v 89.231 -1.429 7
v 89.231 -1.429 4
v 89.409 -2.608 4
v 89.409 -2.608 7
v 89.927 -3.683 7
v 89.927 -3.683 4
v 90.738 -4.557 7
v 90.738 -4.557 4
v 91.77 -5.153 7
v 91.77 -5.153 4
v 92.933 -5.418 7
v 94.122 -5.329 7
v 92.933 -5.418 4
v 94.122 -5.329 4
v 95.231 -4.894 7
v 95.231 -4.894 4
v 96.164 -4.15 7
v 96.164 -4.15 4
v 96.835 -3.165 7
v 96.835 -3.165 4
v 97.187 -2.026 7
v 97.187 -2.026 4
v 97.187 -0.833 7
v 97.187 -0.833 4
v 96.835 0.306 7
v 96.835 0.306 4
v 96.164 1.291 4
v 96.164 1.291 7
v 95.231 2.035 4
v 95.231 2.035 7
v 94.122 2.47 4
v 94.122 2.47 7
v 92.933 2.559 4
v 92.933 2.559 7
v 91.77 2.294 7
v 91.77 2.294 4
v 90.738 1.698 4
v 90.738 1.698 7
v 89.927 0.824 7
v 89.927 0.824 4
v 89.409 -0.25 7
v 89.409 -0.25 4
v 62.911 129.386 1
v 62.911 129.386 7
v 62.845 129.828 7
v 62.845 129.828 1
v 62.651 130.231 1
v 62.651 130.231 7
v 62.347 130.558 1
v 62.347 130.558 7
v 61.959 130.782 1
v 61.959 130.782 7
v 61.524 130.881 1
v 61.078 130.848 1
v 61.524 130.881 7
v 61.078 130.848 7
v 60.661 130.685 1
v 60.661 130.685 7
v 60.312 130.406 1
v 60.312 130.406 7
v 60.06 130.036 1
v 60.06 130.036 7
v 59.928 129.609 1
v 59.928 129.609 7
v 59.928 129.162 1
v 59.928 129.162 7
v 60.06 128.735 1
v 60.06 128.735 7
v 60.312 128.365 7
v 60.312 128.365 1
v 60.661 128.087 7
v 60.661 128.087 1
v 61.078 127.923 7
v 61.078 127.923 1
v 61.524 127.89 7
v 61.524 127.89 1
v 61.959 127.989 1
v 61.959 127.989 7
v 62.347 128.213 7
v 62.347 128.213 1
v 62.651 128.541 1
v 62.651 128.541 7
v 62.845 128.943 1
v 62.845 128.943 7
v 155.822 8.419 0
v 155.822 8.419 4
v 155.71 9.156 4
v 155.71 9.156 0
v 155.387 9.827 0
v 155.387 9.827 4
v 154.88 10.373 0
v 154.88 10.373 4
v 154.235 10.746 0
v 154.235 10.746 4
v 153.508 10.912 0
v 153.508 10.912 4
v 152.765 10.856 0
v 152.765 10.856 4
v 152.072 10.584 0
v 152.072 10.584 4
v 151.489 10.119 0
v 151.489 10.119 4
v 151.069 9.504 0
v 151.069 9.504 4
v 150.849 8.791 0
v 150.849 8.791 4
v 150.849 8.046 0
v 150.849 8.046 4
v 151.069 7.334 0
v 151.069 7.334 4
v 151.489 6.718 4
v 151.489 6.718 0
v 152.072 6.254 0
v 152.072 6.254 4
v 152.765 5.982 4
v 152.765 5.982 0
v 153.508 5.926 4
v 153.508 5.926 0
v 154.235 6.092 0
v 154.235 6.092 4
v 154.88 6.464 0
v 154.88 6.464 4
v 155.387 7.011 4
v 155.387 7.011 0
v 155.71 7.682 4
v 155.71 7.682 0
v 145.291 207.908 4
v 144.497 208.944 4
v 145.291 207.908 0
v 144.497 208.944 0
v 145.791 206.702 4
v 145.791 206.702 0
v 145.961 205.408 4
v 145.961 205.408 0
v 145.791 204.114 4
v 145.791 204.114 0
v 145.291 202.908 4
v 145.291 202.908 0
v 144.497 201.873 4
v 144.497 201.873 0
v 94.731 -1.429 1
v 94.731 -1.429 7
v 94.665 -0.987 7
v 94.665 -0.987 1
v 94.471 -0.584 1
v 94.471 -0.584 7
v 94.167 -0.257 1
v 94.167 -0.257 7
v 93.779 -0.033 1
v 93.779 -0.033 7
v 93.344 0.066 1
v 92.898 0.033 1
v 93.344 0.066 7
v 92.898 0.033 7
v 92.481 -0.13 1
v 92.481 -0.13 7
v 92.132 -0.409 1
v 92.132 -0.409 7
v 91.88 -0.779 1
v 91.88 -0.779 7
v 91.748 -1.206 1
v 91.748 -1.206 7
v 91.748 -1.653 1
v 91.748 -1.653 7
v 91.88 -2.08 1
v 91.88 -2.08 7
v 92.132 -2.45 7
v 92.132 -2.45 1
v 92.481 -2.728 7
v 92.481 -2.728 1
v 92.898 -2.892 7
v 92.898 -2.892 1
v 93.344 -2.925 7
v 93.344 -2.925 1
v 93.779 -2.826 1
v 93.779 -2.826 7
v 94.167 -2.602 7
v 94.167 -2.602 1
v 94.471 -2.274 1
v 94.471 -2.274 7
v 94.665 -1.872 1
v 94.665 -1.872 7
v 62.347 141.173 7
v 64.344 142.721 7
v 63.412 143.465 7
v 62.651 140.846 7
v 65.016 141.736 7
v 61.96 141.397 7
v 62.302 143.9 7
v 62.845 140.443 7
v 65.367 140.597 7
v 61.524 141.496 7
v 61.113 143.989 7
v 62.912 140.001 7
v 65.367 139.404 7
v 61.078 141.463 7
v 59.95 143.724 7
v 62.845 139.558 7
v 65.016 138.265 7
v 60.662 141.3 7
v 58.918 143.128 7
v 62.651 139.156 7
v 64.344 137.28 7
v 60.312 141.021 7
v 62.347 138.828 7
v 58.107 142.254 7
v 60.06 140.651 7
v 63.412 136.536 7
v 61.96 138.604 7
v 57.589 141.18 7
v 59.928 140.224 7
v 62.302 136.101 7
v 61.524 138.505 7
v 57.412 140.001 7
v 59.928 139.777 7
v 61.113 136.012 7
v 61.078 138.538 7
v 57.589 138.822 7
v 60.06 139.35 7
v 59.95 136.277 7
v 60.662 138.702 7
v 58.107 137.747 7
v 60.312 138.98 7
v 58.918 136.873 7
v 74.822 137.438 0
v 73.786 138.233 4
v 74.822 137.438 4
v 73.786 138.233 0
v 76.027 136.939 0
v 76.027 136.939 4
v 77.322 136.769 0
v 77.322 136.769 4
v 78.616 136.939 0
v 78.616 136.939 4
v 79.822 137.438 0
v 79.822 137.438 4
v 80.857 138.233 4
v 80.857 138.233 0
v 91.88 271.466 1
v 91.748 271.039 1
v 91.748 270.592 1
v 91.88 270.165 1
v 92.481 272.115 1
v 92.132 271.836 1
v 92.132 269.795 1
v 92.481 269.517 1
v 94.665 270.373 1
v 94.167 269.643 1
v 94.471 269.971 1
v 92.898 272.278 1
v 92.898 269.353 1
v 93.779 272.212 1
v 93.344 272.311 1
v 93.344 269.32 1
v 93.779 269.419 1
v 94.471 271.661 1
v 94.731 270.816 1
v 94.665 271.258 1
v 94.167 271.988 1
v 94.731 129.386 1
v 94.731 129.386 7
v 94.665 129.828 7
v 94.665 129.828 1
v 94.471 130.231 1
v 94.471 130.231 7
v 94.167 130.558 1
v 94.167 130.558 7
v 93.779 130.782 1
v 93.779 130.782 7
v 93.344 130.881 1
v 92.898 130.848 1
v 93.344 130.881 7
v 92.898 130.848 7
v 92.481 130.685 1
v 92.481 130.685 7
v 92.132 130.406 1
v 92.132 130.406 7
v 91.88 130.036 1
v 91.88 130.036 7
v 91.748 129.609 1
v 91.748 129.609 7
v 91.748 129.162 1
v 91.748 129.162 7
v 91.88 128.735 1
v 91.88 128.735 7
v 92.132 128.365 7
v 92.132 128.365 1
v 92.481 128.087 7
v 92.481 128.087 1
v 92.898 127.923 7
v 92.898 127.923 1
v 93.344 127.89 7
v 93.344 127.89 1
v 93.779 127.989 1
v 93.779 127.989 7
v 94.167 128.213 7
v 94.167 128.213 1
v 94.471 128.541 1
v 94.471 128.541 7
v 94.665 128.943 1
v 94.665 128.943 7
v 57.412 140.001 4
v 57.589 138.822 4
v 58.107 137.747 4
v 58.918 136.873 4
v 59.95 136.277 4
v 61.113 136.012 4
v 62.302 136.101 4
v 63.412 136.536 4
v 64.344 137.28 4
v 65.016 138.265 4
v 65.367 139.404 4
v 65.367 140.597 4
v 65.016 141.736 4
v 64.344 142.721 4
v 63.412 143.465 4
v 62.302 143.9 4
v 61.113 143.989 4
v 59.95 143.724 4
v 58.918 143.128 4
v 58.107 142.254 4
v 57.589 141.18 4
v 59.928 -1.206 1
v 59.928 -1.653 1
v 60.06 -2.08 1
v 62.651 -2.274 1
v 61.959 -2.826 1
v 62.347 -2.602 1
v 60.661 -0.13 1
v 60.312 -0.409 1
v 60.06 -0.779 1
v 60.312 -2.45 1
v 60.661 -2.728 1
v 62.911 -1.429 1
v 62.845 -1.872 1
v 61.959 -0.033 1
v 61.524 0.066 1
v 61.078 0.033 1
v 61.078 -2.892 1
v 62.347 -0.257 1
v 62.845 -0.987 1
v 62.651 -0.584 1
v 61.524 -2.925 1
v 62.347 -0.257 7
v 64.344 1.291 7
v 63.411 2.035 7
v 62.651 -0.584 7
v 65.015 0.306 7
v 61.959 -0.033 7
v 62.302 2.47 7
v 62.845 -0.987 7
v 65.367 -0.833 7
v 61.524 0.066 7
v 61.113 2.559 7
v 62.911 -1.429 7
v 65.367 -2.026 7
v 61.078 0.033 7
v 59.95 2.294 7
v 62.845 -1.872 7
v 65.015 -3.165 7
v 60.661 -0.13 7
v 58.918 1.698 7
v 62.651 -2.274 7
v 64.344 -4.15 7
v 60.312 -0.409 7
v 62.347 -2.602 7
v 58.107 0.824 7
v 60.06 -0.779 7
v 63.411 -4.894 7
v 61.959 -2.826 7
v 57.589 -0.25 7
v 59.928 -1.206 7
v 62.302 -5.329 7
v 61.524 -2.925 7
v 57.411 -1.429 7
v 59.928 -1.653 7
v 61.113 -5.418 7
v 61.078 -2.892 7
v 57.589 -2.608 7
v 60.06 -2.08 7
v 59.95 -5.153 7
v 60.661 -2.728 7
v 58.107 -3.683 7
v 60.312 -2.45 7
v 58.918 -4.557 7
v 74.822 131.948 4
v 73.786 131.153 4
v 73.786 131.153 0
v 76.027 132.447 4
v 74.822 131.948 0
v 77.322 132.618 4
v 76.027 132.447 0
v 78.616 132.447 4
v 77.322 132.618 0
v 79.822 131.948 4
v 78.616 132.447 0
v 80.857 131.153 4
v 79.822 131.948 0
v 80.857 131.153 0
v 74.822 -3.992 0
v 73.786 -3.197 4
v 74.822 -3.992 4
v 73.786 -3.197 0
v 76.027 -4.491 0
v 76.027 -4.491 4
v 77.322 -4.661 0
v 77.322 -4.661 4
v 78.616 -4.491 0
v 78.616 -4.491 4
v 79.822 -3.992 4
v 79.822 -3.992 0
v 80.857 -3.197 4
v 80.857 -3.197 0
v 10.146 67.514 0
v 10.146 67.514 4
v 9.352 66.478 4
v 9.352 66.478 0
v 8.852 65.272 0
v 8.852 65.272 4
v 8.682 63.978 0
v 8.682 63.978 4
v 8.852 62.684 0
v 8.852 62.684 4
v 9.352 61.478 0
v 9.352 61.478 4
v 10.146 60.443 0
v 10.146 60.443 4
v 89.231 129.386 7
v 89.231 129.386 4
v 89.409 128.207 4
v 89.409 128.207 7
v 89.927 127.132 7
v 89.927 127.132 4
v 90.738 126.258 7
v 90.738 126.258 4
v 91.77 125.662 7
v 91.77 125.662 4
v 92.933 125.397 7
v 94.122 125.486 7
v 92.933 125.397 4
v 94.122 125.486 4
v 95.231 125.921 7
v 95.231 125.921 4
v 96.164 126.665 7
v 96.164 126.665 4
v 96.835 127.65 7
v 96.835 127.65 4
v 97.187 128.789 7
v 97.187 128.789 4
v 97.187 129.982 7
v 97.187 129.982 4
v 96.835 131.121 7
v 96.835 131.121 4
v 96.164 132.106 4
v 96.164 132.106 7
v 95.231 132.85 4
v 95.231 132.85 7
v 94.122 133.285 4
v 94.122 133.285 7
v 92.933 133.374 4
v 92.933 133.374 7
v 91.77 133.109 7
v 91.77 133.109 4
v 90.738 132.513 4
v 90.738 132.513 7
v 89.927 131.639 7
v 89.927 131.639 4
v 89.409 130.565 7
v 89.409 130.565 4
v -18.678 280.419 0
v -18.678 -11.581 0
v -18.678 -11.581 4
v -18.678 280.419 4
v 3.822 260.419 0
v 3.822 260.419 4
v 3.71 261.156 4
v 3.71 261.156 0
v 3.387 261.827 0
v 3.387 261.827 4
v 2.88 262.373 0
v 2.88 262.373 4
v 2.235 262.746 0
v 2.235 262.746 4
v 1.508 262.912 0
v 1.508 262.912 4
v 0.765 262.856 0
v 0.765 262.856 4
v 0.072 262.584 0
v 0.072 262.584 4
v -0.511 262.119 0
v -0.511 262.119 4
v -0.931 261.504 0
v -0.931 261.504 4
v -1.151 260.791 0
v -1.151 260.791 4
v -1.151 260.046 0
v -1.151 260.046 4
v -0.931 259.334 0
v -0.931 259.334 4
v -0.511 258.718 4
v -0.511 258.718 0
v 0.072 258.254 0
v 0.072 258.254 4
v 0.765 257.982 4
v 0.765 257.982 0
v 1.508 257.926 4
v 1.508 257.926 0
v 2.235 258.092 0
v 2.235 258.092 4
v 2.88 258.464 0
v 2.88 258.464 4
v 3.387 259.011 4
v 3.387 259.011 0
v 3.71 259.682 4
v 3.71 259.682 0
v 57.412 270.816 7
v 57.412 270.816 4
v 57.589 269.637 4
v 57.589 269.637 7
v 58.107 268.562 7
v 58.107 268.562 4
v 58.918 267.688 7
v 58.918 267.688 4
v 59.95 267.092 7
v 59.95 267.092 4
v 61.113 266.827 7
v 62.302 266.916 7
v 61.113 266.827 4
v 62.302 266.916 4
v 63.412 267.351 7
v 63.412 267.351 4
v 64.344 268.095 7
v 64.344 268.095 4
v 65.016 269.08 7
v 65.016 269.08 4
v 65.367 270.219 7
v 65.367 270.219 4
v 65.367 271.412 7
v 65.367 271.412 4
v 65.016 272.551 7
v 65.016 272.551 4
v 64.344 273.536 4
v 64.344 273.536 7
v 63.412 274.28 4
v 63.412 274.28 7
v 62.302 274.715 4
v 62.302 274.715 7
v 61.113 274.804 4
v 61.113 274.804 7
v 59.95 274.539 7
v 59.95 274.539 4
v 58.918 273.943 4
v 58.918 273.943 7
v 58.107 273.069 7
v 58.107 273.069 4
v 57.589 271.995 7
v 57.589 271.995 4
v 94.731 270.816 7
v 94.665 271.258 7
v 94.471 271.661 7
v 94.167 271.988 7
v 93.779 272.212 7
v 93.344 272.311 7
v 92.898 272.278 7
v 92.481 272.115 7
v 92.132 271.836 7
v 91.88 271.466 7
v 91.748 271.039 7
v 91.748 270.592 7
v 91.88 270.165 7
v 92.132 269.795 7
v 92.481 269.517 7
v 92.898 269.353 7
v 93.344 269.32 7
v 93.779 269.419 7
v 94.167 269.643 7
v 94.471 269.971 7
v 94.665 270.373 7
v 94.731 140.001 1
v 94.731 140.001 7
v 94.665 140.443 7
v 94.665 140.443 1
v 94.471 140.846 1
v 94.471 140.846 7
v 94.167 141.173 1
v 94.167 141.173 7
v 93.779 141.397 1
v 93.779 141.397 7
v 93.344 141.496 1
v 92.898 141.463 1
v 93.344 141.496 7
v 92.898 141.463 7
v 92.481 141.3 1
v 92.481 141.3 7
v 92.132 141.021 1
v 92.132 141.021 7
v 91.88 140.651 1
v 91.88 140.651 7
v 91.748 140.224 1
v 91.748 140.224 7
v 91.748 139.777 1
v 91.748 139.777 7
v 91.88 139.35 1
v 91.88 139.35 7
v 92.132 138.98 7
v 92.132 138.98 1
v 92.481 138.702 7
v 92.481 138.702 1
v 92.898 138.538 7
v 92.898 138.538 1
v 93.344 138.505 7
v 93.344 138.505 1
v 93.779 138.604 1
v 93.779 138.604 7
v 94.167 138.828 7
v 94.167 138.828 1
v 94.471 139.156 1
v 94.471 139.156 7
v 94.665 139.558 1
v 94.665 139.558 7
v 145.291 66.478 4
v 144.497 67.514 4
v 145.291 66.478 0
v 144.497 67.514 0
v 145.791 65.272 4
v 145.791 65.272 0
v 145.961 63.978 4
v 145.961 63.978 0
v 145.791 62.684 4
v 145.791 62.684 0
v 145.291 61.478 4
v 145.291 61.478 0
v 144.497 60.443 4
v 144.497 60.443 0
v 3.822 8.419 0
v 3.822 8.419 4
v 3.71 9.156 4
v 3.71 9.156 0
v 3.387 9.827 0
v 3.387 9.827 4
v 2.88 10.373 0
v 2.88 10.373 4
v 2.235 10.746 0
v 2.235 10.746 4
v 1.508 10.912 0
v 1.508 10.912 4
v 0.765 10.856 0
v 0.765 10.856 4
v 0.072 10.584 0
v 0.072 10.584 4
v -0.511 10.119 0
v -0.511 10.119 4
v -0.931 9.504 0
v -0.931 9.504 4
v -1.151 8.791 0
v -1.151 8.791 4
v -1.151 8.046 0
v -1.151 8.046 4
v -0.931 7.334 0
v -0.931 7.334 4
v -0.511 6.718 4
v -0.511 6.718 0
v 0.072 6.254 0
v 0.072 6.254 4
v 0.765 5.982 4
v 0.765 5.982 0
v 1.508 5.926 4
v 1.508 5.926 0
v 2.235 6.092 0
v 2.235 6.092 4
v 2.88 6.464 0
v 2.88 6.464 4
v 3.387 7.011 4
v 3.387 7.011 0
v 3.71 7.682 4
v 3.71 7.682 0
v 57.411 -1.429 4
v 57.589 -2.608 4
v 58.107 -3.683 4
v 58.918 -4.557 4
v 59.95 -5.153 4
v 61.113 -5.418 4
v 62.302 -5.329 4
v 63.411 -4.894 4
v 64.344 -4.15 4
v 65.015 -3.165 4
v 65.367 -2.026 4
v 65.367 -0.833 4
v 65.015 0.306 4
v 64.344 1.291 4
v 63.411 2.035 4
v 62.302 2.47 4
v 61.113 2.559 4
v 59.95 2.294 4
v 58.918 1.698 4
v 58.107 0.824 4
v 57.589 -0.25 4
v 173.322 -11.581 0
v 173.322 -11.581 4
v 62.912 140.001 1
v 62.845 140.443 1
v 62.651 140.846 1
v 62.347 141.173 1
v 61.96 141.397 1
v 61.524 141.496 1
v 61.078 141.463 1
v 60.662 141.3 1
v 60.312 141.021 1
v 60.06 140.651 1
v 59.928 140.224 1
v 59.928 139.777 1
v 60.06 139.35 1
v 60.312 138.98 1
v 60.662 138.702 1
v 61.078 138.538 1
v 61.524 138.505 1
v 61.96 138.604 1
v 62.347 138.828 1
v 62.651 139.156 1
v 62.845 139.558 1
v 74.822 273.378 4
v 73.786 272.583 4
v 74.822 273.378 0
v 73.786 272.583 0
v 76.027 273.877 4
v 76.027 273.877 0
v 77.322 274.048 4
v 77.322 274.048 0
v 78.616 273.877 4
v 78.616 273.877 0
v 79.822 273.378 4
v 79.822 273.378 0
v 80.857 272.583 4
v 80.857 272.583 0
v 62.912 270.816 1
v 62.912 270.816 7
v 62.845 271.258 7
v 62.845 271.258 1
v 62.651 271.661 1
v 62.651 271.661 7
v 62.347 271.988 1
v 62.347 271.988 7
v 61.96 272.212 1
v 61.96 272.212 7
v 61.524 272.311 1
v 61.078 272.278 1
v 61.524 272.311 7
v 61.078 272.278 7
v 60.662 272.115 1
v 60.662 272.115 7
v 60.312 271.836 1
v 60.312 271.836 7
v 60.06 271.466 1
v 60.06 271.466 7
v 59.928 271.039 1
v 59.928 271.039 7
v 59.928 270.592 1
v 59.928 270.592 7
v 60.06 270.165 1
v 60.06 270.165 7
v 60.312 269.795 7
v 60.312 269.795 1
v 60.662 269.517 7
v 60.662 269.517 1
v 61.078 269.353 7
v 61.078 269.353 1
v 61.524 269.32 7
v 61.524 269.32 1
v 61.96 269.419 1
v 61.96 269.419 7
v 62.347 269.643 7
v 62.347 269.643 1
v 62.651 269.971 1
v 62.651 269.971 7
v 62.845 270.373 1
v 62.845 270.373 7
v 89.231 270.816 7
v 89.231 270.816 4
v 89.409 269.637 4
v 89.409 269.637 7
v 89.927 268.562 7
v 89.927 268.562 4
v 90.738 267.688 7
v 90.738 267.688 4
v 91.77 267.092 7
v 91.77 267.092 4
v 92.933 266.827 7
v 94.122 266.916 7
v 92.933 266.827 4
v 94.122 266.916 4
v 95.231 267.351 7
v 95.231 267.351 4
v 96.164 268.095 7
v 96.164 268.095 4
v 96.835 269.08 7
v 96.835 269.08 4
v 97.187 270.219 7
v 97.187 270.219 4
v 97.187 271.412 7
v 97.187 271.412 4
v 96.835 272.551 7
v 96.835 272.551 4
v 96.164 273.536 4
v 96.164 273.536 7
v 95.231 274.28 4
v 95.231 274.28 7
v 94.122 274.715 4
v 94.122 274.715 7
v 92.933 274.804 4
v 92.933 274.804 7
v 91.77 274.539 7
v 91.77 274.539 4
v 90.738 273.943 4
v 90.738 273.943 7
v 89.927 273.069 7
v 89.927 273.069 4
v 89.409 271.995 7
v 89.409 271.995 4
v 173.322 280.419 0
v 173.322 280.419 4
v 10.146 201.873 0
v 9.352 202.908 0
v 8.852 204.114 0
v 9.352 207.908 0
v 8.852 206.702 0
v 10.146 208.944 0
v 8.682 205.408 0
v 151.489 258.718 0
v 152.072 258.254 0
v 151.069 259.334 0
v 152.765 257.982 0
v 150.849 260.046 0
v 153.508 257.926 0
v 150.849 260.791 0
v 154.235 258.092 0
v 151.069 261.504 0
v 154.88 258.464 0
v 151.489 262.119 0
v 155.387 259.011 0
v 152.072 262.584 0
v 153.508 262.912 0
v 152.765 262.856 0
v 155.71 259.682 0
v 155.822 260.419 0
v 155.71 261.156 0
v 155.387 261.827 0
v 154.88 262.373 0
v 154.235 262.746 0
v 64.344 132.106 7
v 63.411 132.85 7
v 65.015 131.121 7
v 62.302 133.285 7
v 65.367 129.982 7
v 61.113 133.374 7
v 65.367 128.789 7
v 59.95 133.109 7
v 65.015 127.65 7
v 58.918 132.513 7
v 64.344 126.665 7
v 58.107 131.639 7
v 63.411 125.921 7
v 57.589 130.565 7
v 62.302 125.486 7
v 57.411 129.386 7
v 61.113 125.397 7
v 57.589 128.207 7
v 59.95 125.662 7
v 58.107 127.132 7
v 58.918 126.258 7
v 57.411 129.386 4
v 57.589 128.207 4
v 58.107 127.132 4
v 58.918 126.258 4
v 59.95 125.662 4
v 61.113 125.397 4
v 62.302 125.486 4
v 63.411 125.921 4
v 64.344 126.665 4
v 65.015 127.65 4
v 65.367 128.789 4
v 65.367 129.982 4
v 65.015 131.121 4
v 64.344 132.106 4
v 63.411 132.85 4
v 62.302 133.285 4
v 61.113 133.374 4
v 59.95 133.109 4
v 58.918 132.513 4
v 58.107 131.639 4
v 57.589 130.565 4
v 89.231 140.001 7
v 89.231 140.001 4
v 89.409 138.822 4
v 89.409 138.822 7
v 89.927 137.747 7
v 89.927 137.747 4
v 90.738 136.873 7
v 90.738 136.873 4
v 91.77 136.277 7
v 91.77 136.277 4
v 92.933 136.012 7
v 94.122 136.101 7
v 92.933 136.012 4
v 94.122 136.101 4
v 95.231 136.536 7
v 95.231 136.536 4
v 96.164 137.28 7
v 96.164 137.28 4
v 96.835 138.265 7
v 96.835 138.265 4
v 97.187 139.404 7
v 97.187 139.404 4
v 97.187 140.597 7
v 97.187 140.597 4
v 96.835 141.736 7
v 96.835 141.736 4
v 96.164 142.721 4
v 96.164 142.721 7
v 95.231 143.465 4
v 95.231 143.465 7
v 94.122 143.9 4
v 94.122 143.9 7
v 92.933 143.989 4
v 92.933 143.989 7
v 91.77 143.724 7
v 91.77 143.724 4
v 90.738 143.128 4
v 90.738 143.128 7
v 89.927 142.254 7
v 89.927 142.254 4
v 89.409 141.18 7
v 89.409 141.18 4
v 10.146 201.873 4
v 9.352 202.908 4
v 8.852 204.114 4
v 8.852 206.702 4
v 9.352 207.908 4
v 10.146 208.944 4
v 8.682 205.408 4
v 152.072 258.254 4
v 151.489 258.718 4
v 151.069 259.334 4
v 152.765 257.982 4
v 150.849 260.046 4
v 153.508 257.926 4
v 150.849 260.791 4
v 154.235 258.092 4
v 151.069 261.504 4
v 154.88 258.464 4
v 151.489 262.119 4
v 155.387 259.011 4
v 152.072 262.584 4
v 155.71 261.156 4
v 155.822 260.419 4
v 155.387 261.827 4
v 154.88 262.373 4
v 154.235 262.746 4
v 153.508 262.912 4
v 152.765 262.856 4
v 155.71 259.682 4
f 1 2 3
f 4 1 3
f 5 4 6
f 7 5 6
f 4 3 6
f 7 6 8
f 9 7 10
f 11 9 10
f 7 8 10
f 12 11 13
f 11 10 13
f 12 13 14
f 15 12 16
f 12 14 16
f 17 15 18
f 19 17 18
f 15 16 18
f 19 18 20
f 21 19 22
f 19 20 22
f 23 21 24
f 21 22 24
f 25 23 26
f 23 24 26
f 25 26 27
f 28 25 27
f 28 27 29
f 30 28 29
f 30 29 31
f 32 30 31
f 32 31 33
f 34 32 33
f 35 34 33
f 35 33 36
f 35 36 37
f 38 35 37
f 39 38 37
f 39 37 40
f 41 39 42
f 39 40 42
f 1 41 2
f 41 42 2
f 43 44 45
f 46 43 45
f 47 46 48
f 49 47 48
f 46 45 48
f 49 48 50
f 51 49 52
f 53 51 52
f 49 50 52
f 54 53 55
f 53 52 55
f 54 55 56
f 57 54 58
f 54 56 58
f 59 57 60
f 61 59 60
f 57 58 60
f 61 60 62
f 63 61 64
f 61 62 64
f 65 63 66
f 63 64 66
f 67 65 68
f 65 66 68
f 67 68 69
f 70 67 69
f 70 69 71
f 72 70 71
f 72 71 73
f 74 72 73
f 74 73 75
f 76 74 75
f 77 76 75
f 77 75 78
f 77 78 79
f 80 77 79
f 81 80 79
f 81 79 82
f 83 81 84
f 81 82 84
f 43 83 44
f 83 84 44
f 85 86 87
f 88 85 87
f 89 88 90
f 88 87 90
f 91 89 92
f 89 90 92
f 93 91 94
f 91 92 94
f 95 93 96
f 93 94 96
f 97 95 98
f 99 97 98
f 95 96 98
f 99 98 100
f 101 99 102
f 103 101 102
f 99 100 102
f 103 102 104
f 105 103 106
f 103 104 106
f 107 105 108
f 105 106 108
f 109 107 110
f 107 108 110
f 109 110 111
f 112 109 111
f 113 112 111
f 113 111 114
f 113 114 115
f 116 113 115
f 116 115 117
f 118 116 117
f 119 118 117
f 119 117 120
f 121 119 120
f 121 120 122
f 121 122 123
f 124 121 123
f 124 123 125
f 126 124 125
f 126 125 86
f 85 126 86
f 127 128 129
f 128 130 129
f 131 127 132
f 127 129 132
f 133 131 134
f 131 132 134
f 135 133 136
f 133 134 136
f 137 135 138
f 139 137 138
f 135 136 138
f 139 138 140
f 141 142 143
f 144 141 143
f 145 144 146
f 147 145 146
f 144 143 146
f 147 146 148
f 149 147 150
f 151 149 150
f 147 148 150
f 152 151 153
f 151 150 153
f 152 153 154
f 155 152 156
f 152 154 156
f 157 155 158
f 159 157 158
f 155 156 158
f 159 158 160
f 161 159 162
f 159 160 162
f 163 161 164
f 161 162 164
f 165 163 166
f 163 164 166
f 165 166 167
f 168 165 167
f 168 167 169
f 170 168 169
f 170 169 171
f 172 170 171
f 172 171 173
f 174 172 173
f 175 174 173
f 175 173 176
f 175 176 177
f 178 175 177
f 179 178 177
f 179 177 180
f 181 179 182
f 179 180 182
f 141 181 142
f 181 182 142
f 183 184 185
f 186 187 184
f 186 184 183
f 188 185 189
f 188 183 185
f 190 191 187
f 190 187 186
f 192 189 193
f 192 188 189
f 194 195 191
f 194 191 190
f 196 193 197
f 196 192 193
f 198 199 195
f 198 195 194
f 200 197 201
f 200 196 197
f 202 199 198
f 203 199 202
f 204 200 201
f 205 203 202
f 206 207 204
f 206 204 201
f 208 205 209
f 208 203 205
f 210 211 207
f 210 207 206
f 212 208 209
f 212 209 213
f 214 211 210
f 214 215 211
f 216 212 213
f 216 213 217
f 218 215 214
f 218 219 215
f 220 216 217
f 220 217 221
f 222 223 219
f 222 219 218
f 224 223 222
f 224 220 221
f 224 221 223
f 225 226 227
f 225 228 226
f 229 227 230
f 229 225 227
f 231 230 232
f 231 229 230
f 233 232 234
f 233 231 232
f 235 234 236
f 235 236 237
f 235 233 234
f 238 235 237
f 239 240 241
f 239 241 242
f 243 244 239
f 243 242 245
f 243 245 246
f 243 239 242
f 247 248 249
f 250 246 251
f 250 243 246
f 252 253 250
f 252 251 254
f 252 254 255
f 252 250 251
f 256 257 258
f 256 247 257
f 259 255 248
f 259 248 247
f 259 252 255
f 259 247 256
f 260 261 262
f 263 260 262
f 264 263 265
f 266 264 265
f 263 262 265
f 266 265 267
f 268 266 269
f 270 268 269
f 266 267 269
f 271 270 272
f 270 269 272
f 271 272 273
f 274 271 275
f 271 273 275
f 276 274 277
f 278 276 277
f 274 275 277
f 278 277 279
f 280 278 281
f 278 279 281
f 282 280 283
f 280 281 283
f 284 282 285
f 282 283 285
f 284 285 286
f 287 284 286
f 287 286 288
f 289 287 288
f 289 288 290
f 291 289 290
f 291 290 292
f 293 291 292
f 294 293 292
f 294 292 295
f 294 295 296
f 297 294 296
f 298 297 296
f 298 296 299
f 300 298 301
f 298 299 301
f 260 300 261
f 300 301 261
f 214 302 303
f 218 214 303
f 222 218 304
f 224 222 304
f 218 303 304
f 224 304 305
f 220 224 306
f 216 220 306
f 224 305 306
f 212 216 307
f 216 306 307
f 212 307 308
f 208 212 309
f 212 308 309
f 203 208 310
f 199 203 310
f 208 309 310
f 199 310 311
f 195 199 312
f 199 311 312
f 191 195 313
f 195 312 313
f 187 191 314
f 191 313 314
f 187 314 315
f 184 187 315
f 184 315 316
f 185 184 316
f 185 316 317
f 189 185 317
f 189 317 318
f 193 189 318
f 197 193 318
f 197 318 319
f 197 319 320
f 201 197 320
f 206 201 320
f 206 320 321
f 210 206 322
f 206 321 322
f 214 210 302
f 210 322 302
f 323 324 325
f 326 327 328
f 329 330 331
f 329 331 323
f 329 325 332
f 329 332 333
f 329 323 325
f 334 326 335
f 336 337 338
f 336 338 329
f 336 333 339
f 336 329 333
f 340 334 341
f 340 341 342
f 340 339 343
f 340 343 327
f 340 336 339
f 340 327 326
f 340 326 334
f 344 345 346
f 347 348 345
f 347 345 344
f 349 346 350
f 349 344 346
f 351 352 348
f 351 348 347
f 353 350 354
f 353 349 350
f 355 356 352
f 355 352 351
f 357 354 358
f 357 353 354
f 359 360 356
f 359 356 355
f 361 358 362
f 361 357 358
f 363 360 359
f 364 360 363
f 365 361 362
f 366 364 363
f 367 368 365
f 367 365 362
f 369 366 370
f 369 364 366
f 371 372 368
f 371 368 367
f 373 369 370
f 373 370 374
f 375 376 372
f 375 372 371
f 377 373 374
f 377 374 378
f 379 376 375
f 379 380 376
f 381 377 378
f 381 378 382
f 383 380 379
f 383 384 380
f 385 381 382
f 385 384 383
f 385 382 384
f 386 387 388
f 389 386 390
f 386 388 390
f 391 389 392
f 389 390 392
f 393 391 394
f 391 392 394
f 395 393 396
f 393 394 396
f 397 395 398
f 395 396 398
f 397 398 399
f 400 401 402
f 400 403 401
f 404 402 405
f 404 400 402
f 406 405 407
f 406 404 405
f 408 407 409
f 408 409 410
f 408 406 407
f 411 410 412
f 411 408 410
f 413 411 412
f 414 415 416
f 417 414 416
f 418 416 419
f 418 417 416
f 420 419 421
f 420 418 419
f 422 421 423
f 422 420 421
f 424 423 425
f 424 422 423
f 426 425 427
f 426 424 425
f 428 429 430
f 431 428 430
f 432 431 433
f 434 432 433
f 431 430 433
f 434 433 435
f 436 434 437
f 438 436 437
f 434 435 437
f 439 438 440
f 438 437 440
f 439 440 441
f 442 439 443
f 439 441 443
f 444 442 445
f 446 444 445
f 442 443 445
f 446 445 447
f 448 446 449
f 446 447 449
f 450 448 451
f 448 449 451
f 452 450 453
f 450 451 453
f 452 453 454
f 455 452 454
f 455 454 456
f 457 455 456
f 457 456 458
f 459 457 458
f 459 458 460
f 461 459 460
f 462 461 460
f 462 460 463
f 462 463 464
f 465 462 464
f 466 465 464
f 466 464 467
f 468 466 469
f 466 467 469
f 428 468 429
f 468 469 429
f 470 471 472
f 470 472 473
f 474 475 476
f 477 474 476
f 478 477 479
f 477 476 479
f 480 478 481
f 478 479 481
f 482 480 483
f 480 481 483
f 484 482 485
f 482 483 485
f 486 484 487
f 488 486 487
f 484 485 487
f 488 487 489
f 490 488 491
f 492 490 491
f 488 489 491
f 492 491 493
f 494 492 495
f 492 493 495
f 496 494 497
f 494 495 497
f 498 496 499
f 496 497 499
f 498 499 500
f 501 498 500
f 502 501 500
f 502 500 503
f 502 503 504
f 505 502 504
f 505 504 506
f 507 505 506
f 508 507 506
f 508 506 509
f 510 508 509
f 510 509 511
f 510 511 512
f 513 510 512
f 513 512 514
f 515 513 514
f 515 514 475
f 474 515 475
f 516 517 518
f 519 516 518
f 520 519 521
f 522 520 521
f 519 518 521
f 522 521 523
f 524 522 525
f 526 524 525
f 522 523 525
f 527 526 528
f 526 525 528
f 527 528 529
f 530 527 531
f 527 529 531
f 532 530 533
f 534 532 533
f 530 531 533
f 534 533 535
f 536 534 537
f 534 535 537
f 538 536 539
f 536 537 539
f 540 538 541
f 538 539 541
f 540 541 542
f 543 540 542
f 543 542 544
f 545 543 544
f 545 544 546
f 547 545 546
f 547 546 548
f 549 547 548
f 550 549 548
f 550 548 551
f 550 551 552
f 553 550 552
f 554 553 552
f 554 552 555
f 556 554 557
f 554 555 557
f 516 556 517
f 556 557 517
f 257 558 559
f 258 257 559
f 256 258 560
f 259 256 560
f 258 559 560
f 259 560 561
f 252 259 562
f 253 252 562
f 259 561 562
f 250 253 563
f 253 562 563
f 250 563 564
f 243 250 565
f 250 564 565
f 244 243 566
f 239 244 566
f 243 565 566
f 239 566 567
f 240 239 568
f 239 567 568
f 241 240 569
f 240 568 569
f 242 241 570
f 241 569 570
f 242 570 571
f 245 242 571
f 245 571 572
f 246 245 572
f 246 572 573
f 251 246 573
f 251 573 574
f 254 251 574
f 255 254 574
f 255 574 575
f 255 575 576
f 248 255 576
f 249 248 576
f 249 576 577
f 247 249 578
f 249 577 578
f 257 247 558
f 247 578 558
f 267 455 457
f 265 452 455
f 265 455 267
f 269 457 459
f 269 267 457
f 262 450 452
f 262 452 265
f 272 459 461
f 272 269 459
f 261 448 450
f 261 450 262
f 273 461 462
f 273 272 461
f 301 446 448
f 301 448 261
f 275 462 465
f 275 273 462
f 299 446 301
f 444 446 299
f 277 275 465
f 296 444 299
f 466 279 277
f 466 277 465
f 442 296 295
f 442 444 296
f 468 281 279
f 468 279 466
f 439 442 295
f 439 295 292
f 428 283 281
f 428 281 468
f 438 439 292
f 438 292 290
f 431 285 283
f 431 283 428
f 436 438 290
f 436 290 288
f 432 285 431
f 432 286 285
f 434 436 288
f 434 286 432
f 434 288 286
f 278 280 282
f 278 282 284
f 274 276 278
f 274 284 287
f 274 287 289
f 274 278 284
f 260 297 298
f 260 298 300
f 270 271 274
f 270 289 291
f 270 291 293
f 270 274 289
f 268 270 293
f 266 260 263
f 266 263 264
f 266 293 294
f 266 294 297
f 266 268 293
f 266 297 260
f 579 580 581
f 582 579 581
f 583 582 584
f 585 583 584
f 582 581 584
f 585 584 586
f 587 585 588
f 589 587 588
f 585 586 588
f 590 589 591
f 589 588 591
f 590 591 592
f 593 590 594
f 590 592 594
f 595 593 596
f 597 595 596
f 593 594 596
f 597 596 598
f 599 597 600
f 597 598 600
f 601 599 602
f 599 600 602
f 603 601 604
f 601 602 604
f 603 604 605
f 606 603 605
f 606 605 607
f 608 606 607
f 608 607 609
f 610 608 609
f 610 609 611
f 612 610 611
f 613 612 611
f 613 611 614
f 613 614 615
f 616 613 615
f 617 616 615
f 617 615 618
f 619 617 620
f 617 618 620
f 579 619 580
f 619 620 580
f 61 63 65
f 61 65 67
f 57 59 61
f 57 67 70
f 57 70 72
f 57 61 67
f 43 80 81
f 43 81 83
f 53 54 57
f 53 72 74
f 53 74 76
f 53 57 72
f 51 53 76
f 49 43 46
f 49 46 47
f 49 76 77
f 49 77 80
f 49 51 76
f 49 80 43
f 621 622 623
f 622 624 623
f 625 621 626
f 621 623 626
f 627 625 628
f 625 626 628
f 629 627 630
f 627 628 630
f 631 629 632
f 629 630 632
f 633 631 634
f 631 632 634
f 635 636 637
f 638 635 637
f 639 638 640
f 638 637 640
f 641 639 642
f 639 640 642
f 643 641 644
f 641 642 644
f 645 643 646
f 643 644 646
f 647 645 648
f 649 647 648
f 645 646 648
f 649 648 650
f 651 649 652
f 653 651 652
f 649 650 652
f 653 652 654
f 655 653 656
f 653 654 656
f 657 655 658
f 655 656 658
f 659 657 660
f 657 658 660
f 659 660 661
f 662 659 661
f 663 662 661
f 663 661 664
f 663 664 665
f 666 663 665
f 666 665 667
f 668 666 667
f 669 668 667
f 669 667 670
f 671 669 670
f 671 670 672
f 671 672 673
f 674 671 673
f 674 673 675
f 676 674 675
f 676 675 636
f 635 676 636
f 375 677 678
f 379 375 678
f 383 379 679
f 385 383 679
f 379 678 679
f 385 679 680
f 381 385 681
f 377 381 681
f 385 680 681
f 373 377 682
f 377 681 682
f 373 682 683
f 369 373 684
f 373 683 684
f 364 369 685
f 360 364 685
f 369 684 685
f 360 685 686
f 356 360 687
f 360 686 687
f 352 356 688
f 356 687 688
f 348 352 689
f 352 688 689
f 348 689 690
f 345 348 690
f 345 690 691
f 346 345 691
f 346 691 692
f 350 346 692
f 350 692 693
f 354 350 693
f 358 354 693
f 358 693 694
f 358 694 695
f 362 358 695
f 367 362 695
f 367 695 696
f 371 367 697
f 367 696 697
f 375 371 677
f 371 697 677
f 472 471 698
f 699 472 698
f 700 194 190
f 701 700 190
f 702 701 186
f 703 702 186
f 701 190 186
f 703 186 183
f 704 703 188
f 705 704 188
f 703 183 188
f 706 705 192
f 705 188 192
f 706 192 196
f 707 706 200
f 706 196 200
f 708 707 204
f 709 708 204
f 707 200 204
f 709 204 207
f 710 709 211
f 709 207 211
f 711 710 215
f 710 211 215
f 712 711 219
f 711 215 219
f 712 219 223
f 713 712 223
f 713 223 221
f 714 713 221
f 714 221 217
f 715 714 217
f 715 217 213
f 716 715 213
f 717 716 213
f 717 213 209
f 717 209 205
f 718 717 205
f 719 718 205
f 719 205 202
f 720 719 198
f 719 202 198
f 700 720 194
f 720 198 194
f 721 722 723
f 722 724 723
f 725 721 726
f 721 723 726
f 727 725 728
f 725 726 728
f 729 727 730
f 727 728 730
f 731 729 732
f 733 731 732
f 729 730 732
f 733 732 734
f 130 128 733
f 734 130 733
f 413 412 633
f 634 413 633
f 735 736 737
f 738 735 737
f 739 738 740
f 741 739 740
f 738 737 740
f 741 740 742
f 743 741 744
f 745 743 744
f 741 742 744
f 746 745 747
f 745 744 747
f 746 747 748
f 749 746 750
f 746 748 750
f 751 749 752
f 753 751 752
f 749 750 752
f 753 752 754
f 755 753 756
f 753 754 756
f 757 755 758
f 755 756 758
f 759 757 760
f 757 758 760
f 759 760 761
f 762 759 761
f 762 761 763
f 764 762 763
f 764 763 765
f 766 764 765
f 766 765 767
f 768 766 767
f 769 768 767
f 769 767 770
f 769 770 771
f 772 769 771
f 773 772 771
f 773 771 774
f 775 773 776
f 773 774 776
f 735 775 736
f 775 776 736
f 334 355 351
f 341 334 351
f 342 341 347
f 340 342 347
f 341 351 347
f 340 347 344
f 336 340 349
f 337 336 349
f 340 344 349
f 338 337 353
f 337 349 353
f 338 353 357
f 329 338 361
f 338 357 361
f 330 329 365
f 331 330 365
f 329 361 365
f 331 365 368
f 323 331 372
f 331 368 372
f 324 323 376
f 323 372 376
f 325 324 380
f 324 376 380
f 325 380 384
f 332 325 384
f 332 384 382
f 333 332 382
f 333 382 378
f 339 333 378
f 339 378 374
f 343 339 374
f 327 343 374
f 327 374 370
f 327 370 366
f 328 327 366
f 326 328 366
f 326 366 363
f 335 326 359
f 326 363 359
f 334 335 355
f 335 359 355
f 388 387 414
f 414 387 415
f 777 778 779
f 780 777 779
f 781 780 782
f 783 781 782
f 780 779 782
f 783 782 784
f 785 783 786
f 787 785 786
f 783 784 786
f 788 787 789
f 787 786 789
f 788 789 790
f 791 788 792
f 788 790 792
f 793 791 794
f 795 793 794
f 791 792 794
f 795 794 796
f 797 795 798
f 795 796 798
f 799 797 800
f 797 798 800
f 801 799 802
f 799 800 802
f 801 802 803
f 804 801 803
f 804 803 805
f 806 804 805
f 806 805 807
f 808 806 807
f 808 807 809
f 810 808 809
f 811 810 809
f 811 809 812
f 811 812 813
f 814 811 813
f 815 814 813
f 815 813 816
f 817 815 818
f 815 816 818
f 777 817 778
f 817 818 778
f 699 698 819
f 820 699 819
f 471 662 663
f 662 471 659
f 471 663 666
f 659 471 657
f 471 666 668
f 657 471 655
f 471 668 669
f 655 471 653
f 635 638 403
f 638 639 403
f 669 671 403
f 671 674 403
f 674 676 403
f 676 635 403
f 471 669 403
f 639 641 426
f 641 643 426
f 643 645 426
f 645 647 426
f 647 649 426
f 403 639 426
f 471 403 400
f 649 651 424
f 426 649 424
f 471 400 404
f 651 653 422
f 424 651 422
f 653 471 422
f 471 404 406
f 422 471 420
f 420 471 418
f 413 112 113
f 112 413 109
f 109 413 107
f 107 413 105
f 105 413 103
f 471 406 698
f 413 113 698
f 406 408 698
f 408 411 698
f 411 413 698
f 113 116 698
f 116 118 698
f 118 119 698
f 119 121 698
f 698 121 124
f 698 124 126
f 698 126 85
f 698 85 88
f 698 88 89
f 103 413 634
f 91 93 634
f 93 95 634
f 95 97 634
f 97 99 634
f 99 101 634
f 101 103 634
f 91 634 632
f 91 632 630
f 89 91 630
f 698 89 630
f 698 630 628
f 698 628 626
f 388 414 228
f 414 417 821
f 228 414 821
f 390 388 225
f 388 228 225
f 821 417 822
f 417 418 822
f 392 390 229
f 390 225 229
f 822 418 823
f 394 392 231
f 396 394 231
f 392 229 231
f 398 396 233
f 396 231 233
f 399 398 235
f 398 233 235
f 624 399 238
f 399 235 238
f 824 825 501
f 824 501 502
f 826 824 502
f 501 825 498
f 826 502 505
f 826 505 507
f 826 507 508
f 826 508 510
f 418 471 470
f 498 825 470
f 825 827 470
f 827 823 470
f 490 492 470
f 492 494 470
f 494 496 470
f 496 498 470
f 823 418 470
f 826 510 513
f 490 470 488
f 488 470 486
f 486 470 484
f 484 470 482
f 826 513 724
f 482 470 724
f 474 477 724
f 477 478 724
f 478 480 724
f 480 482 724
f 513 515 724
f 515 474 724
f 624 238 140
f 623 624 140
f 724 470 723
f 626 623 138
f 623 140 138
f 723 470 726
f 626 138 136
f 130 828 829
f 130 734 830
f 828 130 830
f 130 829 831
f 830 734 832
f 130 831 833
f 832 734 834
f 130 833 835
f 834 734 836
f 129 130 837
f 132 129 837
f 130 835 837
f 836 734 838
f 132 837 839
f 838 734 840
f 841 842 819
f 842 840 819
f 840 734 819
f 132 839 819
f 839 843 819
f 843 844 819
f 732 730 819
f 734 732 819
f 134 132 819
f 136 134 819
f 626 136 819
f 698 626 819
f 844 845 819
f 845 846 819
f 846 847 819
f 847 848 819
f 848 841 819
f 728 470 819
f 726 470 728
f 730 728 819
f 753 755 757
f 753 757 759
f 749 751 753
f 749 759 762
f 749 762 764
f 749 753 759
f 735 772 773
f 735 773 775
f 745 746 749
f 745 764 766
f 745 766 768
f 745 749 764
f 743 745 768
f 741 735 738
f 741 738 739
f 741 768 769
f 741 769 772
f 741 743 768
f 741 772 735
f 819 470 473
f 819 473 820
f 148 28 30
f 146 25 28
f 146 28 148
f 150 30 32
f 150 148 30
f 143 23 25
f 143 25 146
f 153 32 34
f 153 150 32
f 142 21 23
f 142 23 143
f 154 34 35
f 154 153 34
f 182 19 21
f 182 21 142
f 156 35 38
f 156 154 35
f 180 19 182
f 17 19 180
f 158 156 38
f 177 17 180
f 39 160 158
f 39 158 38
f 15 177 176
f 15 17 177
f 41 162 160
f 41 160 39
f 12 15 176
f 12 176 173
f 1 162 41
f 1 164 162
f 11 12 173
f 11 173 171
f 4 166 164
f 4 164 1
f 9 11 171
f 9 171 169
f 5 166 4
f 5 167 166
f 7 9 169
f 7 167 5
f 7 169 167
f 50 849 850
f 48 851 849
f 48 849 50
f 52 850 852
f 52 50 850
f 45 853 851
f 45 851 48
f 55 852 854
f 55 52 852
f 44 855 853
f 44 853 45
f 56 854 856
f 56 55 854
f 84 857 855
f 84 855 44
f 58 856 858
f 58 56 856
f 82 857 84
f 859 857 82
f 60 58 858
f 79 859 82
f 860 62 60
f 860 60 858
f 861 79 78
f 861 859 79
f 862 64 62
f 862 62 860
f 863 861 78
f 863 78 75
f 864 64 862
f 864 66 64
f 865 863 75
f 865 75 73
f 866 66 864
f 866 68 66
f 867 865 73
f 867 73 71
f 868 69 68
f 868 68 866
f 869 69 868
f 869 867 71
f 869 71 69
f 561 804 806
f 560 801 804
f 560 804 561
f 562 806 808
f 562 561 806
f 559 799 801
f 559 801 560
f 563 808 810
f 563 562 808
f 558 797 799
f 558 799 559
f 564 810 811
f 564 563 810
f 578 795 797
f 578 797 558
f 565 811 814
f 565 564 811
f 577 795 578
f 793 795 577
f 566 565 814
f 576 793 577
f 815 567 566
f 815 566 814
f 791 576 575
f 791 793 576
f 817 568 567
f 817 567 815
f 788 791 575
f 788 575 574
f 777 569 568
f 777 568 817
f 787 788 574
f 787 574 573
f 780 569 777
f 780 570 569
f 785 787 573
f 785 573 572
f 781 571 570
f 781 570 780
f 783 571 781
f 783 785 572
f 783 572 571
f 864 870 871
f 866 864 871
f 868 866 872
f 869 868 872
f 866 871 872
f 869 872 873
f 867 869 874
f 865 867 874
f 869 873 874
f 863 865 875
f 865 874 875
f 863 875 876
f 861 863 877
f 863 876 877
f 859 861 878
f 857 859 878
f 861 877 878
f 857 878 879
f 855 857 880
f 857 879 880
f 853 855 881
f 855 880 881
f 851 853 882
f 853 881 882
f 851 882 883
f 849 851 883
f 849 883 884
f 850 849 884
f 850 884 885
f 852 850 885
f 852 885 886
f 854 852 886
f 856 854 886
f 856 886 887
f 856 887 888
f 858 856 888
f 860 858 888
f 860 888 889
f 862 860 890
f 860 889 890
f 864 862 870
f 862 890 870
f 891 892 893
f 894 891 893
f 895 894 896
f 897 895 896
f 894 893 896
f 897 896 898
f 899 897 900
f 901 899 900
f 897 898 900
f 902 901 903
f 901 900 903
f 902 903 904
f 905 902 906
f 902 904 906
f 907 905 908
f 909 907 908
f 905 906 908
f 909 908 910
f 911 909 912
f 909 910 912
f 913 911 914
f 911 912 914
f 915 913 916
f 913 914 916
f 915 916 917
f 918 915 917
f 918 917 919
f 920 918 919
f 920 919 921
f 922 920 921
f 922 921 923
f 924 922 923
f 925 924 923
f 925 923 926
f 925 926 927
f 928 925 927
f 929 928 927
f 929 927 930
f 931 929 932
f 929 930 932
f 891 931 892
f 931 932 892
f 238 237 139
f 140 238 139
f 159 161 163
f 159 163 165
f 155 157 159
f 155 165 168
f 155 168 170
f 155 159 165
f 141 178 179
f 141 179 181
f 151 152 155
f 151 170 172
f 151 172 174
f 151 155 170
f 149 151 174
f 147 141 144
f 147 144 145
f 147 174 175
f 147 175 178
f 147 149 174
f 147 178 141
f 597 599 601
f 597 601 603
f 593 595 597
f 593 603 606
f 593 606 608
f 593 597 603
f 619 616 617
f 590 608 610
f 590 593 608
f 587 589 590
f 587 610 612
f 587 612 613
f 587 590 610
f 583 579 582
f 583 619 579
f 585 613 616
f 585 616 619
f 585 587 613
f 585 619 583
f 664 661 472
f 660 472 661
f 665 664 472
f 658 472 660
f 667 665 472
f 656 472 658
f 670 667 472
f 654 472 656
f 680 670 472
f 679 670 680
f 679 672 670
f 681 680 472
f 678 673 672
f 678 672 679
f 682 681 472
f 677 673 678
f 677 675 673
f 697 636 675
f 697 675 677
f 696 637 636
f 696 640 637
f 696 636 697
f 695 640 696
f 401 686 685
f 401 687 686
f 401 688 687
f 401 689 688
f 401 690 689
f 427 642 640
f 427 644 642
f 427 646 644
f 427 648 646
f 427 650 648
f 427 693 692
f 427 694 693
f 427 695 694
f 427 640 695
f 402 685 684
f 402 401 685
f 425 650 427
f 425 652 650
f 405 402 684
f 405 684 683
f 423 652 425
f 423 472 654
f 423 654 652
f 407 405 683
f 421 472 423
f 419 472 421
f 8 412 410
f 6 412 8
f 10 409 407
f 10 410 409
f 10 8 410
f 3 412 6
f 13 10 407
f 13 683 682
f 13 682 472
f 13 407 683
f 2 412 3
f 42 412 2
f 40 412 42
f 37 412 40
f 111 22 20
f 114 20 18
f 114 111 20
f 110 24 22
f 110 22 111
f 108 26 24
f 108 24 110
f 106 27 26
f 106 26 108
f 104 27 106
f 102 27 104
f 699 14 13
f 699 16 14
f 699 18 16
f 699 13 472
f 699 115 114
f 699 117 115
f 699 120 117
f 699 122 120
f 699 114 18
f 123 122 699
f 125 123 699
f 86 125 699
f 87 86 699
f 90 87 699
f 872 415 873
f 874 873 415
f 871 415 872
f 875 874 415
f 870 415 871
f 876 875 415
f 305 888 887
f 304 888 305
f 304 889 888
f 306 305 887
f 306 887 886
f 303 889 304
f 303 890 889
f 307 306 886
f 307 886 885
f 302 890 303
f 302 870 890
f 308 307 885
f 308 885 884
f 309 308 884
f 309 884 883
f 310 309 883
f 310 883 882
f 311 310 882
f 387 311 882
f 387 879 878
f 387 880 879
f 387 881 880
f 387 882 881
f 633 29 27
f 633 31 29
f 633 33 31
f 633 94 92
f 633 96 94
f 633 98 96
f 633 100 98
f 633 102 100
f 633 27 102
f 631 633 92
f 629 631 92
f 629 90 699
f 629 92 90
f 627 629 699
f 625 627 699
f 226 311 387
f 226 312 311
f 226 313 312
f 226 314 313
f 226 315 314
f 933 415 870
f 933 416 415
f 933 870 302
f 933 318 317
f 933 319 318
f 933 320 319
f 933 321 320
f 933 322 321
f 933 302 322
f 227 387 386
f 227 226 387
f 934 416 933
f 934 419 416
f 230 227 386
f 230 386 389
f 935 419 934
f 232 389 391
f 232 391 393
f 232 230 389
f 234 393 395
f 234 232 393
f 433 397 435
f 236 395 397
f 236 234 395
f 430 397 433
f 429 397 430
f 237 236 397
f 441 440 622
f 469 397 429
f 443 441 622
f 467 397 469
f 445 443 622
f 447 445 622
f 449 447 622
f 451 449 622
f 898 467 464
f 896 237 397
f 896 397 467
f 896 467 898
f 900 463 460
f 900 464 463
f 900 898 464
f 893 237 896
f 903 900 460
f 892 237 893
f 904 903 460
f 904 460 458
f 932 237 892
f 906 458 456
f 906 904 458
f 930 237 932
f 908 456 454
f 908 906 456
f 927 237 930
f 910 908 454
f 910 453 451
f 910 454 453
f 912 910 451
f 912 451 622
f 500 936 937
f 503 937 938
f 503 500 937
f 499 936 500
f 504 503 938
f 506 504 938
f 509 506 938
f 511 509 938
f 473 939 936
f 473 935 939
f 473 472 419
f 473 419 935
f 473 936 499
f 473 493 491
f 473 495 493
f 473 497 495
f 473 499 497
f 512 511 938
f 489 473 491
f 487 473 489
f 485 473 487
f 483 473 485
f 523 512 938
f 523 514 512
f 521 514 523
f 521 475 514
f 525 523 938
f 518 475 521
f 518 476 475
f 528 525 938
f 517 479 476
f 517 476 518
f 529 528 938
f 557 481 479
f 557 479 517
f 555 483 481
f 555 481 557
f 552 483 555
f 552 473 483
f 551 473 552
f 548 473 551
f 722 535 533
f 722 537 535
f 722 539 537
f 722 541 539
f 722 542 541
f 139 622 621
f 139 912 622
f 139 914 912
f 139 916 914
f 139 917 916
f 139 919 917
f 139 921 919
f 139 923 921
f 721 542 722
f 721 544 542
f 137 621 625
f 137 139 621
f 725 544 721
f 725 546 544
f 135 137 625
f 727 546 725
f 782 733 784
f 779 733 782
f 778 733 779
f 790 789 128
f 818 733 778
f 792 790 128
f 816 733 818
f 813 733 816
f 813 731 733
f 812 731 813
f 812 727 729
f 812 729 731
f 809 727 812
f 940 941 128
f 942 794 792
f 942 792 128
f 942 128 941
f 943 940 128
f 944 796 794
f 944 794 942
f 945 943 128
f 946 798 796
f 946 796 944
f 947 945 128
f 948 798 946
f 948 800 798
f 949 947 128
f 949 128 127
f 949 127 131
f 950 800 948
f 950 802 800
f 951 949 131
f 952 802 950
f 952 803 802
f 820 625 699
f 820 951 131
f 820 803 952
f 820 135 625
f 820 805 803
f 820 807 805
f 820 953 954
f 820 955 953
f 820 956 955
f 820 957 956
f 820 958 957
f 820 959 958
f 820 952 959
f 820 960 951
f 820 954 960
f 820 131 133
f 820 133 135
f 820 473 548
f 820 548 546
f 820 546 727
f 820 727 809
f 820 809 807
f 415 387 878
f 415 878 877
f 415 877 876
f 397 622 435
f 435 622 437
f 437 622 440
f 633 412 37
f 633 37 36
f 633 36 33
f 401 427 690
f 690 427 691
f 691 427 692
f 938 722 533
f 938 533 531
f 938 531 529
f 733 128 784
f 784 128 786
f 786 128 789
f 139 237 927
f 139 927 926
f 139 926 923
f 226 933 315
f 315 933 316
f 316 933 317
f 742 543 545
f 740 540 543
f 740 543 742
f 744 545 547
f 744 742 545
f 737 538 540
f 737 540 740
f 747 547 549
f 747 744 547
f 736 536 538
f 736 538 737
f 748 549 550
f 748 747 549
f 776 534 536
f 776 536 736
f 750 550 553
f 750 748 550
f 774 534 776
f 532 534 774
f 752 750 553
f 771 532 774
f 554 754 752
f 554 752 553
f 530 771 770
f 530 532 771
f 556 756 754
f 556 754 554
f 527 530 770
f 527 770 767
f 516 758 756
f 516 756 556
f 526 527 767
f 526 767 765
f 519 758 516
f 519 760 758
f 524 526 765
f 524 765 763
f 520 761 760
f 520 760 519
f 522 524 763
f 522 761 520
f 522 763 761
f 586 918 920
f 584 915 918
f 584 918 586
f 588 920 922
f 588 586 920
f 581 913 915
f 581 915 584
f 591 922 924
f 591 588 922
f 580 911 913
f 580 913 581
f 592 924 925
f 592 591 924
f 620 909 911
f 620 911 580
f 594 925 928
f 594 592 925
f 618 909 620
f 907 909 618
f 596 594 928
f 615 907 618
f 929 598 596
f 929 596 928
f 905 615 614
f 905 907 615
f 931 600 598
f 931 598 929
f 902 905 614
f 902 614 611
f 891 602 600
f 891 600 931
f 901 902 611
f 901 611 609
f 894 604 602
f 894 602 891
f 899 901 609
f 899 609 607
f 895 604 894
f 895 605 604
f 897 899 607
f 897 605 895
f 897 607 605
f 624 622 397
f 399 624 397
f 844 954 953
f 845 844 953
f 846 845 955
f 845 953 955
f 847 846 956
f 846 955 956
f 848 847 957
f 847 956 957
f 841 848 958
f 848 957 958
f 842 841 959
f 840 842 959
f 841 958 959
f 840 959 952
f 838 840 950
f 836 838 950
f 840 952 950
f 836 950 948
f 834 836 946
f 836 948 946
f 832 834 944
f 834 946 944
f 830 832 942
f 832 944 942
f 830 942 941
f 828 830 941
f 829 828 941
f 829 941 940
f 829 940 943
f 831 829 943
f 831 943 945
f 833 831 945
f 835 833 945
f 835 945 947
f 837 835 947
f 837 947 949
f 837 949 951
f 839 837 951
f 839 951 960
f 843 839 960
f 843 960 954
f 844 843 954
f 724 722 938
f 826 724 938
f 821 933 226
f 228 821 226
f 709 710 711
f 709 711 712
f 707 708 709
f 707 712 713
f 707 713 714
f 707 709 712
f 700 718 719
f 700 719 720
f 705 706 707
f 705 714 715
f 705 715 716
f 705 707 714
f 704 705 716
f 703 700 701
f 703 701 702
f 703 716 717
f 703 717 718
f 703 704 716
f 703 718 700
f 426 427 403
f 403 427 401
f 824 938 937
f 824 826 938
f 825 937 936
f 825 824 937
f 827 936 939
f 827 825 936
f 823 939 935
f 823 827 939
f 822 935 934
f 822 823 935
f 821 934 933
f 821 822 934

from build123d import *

# Parameters (mm, degrees)
ESQUISSE1_W                          = 192
ESQUISSE1_H                          = 292
BOSS_EXTRU_1_DEPTH                   = 4
ENL_V_MAT_EXTRU_17_DEPTH             = 330.683341579
R_P_TITION_LIN_AIRE2_COUNT           = 2
R_P_TITION_LIN_AIRE2_PITCH           = 141.43
ESQUISSE5_R                          = 4
BOSS_EXTRU_2_DEPTH                   = 3
ESQUISSE6_R                          = 1.5
ENL_V_MAT_EXTRU_18_DEPTH             = 6
ESQUISSE7_R                          = 1.5
ENL_V_MAT_EXTRU_19_DEPTH             = 6
R_P_TITION_LIN_AIRE5_COUNT           = 2
R_P_TITION_LIN_AIRE5_PITCH           = 130.815
ESQUISSE10_R                         = 1.5
ENL_V_MAT_EXTRU_20_DEPTH             = 6
ESQUISSE9_R                          = 4
BOSS_EXTRU_3_DEPTH                   = 3
ESQUISSE11_R                         = 1.5
ENL_V_MAT_EXTRU_21_DEPTH             = 6
R_P_TITION_LIN_AIRE6_COUNT           = 2
R_P_TITION_LIN_AIRE6_PITCH           = 31.82
R_P_TITION_LIN_AIRE7_COUNT           = 2
R_P_TITION_LIN_AIRE7_PITCH           = 130.815
R_P_TITION_LIN_AIRE7_COPY_1_SKETCH_R = 4
R_P_TITION_LIN_AIRE7_COPY_1_DEPTH    = 3
R_P_TITION_LIN_AIRE7_COPY_2_SKETCH_R = 1.5
R_P_TITION_LIN_AIRE7_COPY_2_DEPTH    = 6
ESQUISSE14_R                         = 2.5
ENL_V_MAT_EXTRU_22_DEPTH             = 330.683341579
CONG_2_R                             = 5


with BuildPart() as part:
    # Esquisse1 → Boss.-Extru.1 (new body)
    with BuildSketch(Plane.XY):
        with Locations((77.321557543, 134.418871343)):
            Rectangle(ESQUISSE1_W, ESQUISSE1_H)
    extrude(amount=BOSS_EXTRU_1_DEPTH)

    # Esquisse4 → Enlèv. mat.-Extru.17 (cut, through all)
    with BuildSketch(Plane.XY.offset(4)):
        Polygon((77.321557543, 276.118871343), (6.610879425, 205.408193225), (77.321557543, 134.697515106), (148.032235662, 205.408193225), align=None)
    enl_v_mat_extru_17 = extrude(amount=-ENL_V_MAT_EXTRU_17_DEPTH, mode=Mode.SUBTRACT)

    # Répétition linéaire2: Enlèv. mat.-Extru.17 ×2
    with Locations(*[(0, -i * R_P_TITION_LIN_AIRE2_PITCH, 0) for i in range(1, R_P_TITION_LIN_AIRE2_COUNT)]):
        add(enl_v_mat_extru_17, mode=Mode.SUBTRACT)

    # Esquisse5 → Boss.-Extru.2 (add)
    with BuildSketch(Plane.XY.offset(4)):
        with Locations(Location((61.411654967, 270.815570484, 0), (0, 0, 180))):
            Circle(ESQUISSE5_R)
        with Locations(Location((93.23146012, 270.815570484, 0), (0, 0, 180))):
            Circle(ESQUISSE5_R)
    boss_extru_2 = extrude(amount=BOSS_EXTRU_2_DEPTH)

    # Esquisse6 → Enlèv. mat.-Extru.18 (cut)
    with BuildSketch(Plane.XY.offset(7)):
        with Locations((61.411654967, 270.815570484)):
            Circle(ESQUISSE6_R)
    enl_v_mat_extru_18 = extrude(amount=-ENL_V_MAT_EXTRU_18_DEPTH, mode=Mode.SUBTRACT)

    # Esquisse7 → Enlèv. mat.-Extru.19 (cut)
    with BuildSketch(Plane.XY.offset(7)):
        with Locations((93.23146012, 270.815570484)):
            Circle(ESQUISSE7_R)
    extrude(amount=-ENL_V_MAT_EXTRU_19_DEPTH, mode=Mode.SUBTRACT)

    # Répétition linéaire5: Boss.-Extru.2, Enlèv. mat.-Extru.18 ×2
    with Locations(*[(0, -i * R_P_TITION_LIN_AIRE5_PITCH, 0) for i in range(1, R_P_TITION_LIN_AIRE5_COUNT)]):
        add(boss_extru_2)
        add(enl_v_mat_extru_18, mode=Mode.SUBTRACT)

    # Esquisse10 → Enlèv. mat.-Extru.20 (cut)
    with BuildSketch(Plane.XY.offset(7)):
        with Locations((93.23146012, 140.000570484)):
            Circle(ESQUISSE10_R)
    extrude(amount=-ENL_V_MAT_EXTRU_20_DEPTH, mode=Mode.SUBTRACT)

    # Esquisse9 → Boss.-Extru.3 (add)
    with BuildSketch(Plane.XY.offset(4)):
        with Locations(Location((93.23146012, 129.385570484, 0), (0, 0, 180))):
            Circle(ESQUISSE9_R)
    boss_extru_3 = extrude(amount=BOSS_EXTRU_3_DEPTH)

    # Esquisse11 → Enlèv. mat.-Extru.21 (cut)
    with BuildSketch(Plane.XY.offset(7)):
        with Locations((93.23146012, 129.385570484)):
            Circle(ESQUISSE11_R)
    enl_v_mat_extru_21 = extrude(amount=-ENL_V_MAT_EXTRU_21_DEPTH, mode=Mode.SUBTRACT)

    # Répétition linéaire6: Boss.-Extru.3, Enlèv. mat.-Extru.21 ×2
    with Locations(*[(-i * R_P_TITION_LIN_AIRE6_PITCH, 0, 0) for i in range(1, R_P_TITION_LIN_AIRE6_COUNT)]):
        add(boss_extru_3)
        add(enl_v_mat_extru_21, mode=Mode.SUBTRACT)

    # Répétition linéaire7: Boss.-Extru.3, Enlèv. mat.-Extru.21 ×2
    with Locations(*[(0, -i * R_P_TITION_LIN_AIRE7_PITCH, 0) for i in range(1, R_P_TITION_LIN_AIRE7_COUNT)]):
        add(boss_extru_3)
        add(enl_v_mat_extru_21, mode=Mode.SUBTRACT)

    # Répétition linéaire7 copy 1 sketch → Répétition linéaire7 copy 1 (add)
    with BuildSketch(Plane(origin=(-31.82, -130.815, 4), x_dir=(1, 0, 0), z_dir=(0, 0, 1))):
        with Locations(Location((93.23146012, 129.385570484, 0), (0, 0, 180))):
            Circle(R_P_TITION_LIN_AIRE7_COPY_1_SKETCH_R)
    extrude(amount=R_P_TITION_LIN_AIRE7_COPY_1_DEPTH)

    # Répétition linéaire7 copy 2 sketch → Répétition linéaire7 copy 2 (cut)
    with BuildSketch(Plane(origin=(-31.82, -130.815, 7), x_dir=(1, 0, 0), z_dir=(0, 0, 1))):
        with Locations((93.23146012, 129.385570484)):
            Circle(R_P_TITION_LIN_AIRE7_COPY_2_SKETCH_R)
    extrude(amount=-R_P_TITION_LIN_AIRE7_COPY_2_DEPTH, mode=Mode.SUBTRACT)

    # Esquisse14 → Enlèv. mat.-Extru.22 (cut, through all)
    with BuildSketch(Plane.XY.offset(4)):
        with Locations((1.321557543, 8.418871343)):
            Circle(ESQUISSE14_R)
        with Locations((153.321557543, 8.418871343)):
            Circle(ESQUISSE14_R)
        with Locations((153.321557543, 260.418871343)):
            Circle(ESQUISSE14_R)
        with Locations((1.321557543, 260.418871343)):
            Circle(ESQUISSE14_R)
    extrude(amount=-ENL_V_MAT_EXTRU_22_DEPTH, mode=Mode.SUBTRACT)

    # Congé2
    cong_2_edges = [part.edges().sort_by_distance(p)[0] for p in [
        (6.610879425, 205.408193225, 2),
        (77.321557543, 276.118871343, 2),
        (148.032235662, 205.408193225, 2),
        (77.321557543, 134.697515106, 2),
        (6.610879425, 63.978193225, 2),
        (77.321557543, 134.688871343, 2),
        (148.032235662, 63.978193225, 2),
        (77.321557543, -6.732484894, 2),
    ]]
    fillet(cong_2_edges, radius=CONG_2_R)


solid = part.part
